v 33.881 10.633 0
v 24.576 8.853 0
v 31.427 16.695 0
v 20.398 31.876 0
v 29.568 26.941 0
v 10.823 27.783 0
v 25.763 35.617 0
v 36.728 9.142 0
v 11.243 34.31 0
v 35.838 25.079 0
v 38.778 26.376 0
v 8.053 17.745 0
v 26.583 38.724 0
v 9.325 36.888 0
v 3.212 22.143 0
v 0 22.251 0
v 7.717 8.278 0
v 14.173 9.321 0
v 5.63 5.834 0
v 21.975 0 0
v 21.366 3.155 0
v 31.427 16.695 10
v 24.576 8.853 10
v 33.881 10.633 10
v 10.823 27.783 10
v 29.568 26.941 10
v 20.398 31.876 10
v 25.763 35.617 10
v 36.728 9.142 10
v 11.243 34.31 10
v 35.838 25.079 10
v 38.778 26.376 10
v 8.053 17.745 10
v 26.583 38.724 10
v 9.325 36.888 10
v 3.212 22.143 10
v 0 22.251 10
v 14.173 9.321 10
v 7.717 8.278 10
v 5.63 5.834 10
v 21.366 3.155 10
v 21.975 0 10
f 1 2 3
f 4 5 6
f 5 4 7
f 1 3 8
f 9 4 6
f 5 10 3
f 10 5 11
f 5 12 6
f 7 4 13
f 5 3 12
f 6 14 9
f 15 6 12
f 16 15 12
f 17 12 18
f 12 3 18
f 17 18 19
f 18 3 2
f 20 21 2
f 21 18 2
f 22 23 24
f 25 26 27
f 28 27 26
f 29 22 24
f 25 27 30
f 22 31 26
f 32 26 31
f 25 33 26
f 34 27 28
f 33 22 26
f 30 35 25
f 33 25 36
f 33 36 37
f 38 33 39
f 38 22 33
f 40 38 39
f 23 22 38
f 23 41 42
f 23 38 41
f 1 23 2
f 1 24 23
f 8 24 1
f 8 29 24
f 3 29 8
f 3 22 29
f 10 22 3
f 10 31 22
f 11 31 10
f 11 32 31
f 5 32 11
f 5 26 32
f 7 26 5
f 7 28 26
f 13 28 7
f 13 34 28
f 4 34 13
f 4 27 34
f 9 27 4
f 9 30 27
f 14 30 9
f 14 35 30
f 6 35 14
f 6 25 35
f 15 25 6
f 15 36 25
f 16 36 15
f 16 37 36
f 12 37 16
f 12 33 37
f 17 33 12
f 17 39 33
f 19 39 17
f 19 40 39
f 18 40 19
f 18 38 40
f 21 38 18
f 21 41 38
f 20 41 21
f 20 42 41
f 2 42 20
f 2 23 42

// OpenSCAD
$fn = 32;

// ----------------------------------------------------------------------
// Fan rotor section: 7 blades, 12 mm hub radius, 8 mm blades
// ----------------------------------------------------------------------

// --- parameters (mm) ---
profile_height = 10;      // extrusion height
profile_points = 21;      // points of the closed outline

profile = [[31.427, 16.695], [35.838, 25.079], [38.778, 26.376], [29.568, 26.941], [25.763, 35.617], [26.583, 38.724], [20.398, 31.876], [11.243, 34.31], [9.325, 36.888], [10.823, 27.783], [3.212, 22.143], [0, 22.251], [8.053, 17.745], [7.717, 8.278], [5.63, 5.834], [14.173, 9.321], [21.366, 3.155], [21.975, 0], [24.576, 8.853], [33.881, 10.633], [36.728, 9.142]];  // single closed polygon, 21 points, counter clockwise

// --- the one profile operation ---
linear_extrude(height = profile_height) polygon(points = profile);
